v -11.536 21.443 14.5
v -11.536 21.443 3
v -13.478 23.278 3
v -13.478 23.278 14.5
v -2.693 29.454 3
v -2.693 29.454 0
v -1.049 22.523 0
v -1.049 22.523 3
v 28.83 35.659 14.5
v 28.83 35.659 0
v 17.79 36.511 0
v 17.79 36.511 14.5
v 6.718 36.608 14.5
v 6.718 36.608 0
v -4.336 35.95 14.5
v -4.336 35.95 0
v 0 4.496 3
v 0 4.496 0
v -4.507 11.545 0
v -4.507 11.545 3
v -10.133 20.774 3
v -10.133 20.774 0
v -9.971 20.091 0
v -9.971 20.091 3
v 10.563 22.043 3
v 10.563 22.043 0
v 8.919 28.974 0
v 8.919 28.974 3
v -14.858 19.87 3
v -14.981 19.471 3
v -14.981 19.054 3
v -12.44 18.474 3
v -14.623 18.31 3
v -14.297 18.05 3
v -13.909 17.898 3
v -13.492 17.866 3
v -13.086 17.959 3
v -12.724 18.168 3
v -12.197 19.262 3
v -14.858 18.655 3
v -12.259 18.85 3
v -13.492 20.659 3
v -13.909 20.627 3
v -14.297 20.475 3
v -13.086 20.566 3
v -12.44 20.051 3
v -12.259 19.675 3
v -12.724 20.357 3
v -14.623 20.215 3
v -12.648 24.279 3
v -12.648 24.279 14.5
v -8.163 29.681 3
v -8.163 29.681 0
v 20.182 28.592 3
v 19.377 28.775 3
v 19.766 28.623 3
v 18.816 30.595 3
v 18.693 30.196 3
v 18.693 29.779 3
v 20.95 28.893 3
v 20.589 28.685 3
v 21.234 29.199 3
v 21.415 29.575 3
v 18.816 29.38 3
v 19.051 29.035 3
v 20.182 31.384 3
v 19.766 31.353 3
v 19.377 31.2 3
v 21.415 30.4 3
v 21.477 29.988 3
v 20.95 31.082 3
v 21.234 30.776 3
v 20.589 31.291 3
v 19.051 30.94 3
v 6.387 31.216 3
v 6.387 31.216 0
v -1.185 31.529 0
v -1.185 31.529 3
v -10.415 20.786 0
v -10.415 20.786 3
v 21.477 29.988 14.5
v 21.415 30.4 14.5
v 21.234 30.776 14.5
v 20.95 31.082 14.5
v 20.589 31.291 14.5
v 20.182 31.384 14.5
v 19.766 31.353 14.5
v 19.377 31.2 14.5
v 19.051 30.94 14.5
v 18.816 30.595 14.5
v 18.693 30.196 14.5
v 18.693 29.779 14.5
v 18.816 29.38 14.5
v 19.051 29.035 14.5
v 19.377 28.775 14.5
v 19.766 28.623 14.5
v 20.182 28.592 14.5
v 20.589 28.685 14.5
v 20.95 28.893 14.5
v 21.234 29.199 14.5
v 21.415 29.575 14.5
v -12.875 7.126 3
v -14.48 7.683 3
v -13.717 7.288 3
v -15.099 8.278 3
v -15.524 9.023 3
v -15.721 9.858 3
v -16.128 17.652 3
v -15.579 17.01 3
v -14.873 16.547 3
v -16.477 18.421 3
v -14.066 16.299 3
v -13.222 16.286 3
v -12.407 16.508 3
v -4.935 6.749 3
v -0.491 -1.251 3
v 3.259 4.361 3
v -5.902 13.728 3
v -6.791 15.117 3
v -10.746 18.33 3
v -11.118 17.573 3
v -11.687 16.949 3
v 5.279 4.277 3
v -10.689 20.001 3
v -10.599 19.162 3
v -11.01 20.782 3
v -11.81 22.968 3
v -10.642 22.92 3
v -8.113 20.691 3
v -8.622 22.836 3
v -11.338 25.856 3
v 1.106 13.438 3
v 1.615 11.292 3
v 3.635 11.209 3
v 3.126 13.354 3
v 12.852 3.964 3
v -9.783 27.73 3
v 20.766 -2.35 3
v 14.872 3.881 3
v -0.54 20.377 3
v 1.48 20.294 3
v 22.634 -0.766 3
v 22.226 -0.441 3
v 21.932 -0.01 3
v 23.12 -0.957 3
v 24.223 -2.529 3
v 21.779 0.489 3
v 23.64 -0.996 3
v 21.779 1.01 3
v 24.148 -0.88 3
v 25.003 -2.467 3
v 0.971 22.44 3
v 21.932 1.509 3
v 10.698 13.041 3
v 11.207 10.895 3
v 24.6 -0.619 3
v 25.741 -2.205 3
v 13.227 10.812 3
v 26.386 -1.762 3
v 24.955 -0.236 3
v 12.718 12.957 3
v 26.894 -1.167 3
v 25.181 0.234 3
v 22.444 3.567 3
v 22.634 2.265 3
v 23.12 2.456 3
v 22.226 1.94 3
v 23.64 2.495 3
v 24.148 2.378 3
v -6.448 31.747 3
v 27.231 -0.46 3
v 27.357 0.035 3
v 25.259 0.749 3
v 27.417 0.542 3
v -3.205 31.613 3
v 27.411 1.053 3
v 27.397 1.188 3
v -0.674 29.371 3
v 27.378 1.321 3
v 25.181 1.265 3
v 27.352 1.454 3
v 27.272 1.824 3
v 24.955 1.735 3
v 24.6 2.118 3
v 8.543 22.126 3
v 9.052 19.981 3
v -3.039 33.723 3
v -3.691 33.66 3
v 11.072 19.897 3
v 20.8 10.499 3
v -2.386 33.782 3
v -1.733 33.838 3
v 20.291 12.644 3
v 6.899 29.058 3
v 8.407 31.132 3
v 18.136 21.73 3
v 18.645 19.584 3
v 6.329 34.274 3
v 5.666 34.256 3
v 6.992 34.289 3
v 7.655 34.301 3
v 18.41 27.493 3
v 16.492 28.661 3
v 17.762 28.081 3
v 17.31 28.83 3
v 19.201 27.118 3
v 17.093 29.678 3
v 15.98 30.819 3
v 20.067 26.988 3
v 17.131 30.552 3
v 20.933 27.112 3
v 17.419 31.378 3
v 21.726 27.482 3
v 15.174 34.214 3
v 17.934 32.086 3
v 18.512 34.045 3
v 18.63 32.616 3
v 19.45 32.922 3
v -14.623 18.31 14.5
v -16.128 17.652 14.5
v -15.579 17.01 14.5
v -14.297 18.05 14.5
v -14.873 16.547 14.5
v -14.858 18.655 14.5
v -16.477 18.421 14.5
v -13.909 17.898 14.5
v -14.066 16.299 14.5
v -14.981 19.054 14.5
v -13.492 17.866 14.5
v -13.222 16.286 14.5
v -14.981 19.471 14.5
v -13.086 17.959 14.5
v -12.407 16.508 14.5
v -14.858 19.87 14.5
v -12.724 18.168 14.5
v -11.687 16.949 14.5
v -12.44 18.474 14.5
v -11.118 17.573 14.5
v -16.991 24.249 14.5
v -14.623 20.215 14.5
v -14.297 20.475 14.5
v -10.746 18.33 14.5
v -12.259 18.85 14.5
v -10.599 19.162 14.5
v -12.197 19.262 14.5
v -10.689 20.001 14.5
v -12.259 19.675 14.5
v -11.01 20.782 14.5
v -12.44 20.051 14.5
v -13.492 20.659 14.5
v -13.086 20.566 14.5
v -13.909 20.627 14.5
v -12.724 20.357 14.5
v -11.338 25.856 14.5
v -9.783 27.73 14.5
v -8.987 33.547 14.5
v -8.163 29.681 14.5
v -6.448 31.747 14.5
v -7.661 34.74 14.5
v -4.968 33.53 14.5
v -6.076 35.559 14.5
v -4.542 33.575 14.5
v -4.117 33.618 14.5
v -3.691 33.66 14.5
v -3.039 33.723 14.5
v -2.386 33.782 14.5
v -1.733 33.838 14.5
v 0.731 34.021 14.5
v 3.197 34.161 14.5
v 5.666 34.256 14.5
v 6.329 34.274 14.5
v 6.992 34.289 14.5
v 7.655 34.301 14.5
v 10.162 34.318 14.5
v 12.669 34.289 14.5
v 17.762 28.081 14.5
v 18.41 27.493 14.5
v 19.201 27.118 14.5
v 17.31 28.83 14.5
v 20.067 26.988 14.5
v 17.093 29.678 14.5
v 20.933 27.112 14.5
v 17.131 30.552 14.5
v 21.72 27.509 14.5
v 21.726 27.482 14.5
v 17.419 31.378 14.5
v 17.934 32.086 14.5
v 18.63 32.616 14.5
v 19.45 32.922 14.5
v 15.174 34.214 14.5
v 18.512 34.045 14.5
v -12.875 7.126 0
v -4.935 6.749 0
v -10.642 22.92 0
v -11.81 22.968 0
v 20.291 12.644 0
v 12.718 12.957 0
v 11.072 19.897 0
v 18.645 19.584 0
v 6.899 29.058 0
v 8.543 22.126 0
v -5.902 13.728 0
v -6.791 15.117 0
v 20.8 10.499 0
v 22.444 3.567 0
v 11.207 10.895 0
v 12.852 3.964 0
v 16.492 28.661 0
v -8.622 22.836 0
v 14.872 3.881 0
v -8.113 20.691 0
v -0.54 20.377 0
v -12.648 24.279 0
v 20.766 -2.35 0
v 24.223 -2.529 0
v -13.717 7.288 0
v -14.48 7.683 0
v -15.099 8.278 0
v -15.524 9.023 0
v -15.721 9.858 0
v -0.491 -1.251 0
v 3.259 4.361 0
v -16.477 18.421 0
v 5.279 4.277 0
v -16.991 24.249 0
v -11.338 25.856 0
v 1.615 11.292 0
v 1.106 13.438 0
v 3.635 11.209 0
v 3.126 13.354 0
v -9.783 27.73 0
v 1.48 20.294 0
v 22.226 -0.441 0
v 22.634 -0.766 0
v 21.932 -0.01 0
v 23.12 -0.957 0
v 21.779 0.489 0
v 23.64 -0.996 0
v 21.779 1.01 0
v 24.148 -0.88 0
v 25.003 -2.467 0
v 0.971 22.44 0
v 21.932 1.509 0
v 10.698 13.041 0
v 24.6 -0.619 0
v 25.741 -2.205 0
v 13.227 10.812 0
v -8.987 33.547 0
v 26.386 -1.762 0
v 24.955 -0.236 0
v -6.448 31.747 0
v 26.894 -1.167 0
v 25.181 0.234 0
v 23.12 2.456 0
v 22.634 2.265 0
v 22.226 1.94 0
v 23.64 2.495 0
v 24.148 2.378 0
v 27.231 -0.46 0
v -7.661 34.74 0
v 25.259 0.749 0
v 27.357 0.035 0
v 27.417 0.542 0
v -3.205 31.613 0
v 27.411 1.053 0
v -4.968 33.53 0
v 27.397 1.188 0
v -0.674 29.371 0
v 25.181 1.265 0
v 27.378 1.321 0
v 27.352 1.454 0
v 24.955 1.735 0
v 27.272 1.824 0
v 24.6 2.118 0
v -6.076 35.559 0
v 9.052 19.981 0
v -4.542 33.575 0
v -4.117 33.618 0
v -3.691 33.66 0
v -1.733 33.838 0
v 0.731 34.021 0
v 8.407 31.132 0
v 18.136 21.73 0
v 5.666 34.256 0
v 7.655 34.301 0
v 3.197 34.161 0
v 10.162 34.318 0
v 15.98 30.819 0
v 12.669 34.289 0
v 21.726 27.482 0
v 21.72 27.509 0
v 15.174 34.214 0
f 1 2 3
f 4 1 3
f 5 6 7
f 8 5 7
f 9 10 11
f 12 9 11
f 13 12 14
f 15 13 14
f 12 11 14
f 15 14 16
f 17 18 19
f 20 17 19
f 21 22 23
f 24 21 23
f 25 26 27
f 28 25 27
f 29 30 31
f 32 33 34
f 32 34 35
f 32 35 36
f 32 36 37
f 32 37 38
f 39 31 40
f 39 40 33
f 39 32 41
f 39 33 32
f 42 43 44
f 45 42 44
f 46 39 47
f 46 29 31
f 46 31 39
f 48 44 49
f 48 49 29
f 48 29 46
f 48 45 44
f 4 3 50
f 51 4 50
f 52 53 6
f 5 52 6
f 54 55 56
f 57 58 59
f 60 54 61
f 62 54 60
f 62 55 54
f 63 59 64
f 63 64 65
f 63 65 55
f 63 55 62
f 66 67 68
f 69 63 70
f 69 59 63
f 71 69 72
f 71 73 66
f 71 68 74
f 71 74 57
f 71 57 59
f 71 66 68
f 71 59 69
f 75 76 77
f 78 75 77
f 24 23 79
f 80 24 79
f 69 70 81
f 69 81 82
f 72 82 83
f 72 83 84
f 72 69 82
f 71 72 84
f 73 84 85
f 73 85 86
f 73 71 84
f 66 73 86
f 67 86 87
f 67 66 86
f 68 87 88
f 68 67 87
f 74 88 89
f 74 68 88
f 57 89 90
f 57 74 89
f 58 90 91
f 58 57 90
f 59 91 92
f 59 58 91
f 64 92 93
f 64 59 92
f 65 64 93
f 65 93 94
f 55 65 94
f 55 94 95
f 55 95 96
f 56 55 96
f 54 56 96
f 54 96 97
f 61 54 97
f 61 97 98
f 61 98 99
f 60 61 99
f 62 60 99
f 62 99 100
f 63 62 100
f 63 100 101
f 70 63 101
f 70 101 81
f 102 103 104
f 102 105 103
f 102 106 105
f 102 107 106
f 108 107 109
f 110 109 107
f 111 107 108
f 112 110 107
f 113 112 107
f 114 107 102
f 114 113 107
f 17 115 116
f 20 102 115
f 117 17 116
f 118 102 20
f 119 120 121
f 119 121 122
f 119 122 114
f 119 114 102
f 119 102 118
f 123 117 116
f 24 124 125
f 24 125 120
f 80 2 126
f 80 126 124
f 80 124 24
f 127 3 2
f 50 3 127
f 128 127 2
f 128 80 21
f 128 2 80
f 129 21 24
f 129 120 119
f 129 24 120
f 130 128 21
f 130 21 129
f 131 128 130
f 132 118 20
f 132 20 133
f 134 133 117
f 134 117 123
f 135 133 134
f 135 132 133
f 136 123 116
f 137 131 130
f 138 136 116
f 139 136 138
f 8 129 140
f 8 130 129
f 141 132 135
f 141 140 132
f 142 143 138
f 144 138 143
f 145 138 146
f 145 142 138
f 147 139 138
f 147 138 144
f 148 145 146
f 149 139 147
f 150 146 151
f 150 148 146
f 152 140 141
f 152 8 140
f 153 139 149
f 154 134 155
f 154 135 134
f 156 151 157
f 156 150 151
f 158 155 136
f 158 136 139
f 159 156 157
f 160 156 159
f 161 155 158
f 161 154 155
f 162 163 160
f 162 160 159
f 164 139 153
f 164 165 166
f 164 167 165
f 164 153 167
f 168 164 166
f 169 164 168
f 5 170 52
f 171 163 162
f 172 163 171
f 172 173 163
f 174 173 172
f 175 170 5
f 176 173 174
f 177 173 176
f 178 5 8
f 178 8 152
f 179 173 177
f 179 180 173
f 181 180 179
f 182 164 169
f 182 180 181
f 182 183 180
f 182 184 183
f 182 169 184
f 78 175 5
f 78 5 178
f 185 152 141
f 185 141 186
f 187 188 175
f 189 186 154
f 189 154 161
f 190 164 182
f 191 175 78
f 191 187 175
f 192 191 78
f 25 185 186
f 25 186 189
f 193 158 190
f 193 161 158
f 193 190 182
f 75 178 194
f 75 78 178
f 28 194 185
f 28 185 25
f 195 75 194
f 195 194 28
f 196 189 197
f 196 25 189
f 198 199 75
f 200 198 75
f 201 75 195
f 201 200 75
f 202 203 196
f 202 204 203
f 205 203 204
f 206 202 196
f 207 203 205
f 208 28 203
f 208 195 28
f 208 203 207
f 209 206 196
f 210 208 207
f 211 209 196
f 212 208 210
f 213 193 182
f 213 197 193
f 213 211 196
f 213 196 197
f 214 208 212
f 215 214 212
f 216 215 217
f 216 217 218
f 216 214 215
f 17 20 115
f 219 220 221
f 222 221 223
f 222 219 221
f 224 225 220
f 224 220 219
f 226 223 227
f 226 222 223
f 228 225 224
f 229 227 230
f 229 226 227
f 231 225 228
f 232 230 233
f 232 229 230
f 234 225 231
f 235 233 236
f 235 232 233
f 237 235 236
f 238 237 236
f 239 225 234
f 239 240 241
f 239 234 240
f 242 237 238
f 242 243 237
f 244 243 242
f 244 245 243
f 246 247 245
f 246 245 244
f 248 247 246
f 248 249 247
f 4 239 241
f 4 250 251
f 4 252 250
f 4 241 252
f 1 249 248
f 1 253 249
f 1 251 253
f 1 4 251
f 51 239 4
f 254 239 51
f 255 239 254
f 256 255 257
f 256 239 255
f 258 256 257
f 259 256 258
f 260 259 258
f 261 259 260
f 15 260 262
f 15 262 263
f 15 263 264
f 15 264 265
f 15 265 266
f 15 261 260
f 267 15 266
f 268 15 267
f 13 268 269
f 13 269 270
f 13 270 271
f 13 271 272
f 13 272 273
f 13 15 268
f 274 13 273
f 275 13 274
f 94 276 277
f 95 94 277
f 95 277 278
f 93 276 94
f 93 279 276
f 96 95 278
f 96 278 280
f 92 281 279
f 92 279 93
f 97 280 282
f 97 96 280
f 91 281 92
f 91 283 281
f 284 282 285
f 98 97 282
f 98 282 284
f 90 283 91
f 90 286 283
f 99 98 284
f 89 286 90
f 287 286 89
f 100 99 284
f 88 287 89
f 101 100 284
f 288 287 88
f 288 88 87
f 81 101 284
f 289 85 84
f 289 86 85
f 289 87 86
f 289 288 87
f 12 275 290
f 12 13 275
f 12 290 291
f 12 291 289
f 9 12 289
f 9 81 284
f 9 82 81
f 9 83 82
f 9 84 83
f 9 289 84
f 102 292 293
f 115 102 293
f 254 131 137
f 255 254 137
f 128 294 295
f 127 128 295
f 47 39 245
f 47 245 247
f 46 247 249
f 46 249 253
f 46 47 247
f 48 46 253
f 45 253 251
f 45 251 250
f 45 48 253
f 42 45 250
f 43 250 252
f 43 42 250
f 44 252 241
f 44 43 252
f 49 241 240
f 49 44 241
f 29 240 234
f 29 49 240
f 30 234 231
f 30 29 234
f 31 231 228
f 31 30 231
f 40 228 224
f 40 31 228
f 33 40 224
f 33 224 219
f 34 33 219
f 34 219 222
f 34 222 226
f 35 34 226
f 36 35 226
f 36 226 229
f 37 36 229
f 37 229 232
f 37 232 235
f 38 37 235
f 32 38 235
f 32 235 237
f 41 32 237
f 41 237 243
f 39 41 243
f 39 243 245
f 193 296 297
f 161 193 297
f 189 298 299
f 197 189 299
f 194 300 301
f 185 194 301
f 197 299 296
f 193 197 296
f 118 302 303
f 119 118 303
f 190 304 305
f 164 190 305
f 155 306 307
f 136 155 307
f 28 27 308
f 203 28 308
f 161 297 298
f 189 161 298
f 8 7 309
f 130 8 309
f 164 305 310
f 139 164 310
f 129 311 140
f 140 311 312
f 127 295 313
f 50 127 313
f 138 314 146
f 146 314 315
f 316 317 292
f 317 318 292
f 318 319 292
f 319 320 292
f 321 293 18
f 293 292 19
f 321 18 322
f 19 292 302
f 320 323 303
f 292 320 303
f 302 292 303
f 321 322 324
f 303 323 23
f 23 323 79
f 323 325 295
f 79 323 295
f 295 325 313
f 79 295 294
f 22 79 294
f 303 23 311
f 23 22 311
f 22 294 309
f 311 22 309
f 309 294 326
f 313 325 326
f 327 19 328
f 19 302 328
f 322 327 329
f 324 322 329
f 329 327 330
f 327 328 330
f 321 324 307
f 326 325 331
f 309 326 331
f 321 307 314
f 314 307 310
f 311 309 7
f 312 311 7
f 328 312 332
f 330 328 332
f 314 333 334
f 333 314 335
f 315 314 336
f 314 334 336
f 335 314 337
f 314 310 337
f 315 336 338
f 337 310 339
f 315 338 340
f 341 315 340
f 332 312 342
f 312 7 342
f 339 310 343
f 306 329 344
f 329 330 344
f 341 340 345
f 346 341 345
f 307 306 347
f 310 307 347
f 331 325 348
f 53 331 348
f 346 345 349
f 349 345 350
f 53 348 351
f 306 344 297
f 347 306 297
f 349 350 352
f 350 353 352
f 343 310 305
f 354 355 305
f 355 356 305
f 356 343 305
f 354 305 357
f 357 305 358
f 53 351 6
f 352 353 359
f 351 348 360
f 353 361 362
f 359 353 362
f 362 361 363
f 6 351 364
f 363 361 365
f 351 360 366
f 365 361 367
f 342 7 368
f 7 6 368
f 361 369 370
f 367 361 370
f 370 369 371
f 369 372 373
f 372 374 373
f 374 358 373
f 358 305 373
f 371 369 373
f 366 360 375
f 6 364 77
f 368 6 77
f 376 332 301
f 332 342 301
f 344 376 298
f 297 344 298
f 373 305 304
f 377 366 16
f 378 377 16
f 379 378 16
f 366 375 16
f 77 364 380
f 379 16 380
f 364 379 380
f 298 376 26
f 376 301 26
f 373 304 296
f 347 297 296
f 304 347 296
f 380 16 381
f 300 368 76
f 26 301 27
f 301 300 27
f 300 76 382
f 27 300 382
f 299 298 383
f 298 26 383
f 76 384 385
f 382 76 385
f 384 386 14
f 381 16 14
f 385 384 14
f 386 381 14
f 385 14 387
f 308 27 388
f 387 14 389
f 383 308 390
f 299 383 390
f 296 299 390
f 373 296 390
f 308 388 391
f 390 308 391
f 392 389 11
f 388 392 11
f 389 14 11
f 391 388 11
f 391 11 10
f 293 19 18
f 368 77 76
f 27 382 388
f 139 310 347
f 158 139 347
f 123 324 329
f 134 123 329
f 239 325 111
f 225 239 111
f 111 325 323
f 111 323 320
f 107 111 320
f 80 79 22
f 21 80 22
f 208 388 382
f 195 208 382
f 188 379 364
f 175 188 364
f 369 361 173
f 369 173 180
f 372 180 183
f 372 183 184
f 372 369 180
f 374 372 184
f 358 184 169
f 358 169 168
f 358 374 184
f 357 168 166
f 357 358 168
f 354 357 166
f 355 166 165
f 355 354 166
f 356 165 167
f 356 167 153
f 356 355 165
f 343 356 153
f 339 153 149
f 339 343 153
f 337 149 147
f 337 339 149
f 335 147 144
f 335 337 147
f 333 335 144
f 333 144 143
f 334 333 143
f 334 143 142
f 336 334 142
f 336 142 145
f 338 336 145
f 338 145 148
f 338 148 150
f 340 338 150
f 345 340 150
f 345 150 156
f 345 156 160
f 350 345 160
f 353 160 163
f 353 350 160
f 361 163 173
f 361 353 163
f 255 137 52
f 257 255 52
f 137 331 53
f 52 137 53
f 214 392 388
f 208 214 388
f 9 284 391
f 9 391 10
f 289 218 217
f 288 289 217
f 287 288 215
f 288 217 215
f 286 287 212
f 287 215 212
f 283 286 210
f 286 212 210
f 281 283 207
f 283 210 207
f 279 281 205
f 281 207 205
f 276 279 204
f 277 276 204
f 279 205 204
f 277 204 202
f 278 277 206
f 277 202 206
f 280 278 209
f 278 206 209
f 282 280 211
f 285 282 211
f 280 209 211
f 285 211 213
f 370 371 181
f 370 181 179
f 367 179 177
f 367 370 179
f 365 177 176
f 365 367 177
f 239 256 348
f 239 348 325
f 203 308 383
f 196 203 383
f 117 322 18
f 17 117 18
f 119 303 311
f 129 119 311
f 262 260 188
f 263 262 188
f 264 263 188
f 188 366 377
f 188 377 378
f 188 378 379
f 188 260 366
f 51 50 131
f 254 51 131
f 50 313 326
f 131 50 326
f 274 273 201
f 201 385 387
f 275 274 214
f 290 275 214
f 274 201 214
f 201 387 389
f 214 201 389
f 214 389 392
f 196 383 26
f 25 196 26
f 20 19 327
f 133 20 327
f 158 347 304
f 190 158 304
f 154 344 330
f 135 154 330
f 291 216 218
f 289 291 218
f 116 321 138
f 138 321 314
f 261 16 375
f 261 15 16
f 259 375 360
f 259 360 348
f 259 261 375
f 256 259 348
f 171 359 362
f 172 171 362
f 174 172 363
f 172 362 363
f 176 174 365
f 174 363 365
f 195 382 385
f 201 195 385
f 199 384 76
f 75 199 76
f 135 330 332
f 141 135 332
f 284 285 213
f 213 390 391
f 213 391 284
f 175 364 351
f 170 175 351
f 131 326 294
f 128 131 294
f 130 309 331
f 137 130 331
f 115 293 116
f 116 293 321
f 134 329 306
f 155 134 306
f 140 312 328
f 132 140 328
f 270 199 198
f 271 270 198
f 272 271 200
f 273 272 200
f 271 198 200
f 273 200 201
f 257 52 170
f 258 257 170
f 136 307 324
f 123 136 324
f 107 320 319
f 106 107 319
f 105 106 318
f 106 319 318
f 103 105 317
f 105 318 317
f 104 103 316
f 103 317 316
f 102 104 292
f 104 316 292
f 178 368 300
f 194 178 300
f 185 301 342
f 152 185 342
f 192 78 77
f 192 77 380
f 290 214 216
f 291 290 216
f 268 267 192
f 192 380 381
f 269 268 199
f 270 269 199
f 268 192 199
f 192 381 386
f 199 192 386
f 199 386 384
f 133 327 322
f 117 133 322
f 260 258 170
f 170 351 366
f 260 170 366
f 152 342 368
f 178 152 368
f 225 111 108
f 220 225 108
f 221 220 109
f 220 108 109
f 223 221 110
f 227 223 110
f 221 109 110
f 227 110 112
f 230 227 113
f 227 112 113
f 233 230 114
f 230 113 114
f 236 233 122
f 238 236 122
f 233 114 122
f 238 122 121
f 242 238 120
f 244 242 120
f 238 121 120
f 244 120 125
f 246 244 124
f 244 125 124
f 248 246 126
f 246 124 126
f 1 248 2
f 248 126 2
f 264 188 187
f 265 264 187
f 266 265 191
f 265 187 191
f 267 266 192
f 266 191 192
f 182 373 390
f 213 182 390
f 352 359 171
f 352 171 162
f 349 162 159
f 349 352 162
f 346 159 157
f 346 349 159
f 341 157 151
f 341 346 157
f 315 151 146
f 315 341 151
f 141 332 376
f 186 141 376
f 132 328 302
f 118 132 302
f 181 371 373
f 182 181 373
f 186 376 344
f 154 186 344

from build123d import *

# Parameters (mm, degrees)
F0_R        = 1.75
F1_DEPTH    = 3
F0_R_2      = 1.4
F2_DEPTH    = 14.5
F3_DEPTH    = 3
F4_R        = 7
F5_T1_DEPTH = 16.6306186867
F5_T3_DEPTH = 4.3681636199
F5_T5_DEPTH = 16.0958411758
F7_DEPTH    = 3


# Not quite as in the source:
# - a fillet or chamfer that OpenCascade refuses, or shapes differently, is made with other operations: its cross-section is extruded or revolved along the edge and cut away or added
# - two fillets or chamfers of one size are made in one step


with BuildPart() as f1:
    # F0 (on Top) → F1 (new body)
    with BuildSketch(Plane.XY):
        with BuildLine():
            Line((-0.4909088138, -1.2505585665), (20.7660850672, -2.35005825))
            Line((20.7660850672, -2.35005825), (25.5381567791, -2.5968895454))
            ThreePointArc((25.5381567791, -2.5968895454), (27.0513379129, -0.9141469555), (27.3799938245, 1.3248986134))
            Line((27.3799938245, 1.3248986134), (27.2720971653, 1.8240689049))
            Line((27.2720971653, 1.8240689049), (21.7261834625, 27.4815394929))
            ThreePointArc((21.7261834625, 27.4815394929), (17.3096816882, 28.8299287619), (19.4503780507, 32.9215128838))
            Line((19.4503780507, 32.9215128838), (18.5115177807, 34.0451927012))
            Line((18.5115177807, 34.0451927012), (15.1742594532, 34.2144082882))
            Line((15.1742594532, 34.2144082882), (15.9797014768, 30.8189948872))
            Line((15.9797014768, 30.8189948872), (16.4916617939, 28.6607800556))
            Line((16.4916617939, 28.6607800556), (18.135858017, 21.7295227758))
            Line((18.135858017, 21.7295227758), (18.644845427, 19.5838405017))
            Line((18.644845427, 19.5838405017), (20.2910235881, 12.6442281836))
            Line((20.2910235881, 12.6442281836), (20.8000109982, 10.4985459094))
            Line((20.8000109982, 10.4985459094), (22.4442072213, 3.5672886297))
            Line((22.4442072213, 3.5672886297), (14.8716080252, 3.8805312748))
            Line((14.8716080252, 3.8805312748), (12.8516365903, 3.9640879479))
            Line((12.8516365903, 3.9640879479), (5.2790373942, 4.2773305929))
            Line((5.2790373942, 4.2773305929), (3.2590659592, 4.360887266))
            Line((3.2590659592, 4.360887266), (0, 4.4956994243))
            Line((0, 4.4956994243), (-4.5071129665, 11.5453820412))
            Line((-4.5071129665, 11.5453820412), (-5.9023623433, 13.727724785))
            Line((-5.9023623433, 13.727724785), (-6.7908302355, 15.1173985523))
            Line((-6.7908302355, 15.1173985523), (-9.9708875905, 20.0914019161))
            Line((-9.9708875905, 20.0914019161), (-10.4149082493, 20.7859051919))
            Line((-10.4149082493, 20.7859051919), (-11.8101576261, 22.9682479357))
            Line((-11.8101576261, 22.9682479357), (-12.6478674294, 24.2785297685))
            Line((-12.6478674294, 24.2785297685), (-13.4783331305, 23.2781674713))
            Line((-13.4783331305, 23.2781674713), (-11.5363753254, 21.4427254814))
            ThreePointArc((-11.5363753254, 21.4427254814), (-12.0316990994, 16.7032264224), (-16.4766345607, 18.4209998989))
            Line((-16.4766345607, 18.4209998989), (-15.4909088138, 7.2494414335))
            Line((-15.4909088138, 7.2494414335), (-4.9353532582, 6.7494414335))
            Line((-4.9353532582, 6.7494414335), (-0.4909088138, -1.2505585665))
        make_face()
        with Locations((23.5090911862, 0.7494414335)):
            Circle(F0_R, mode=Mode.SUBTRACT)
    extrude(amount=F1_DEPTH)

    # F0 (on Top) → F2 (join)
    with BuildSketch(Plane.XY):
        with BuildLine():
            Line((-16.9909088138, 24.2494414335), (-16.4766345607, 18.4209998989))
            ThreePointArc((-16.4766345607, 18.4209998989), (-12.0316990994, 16.7032264224), (-11.5363753254, 21.4427254814))
            Line((-11.5363753254, 21.4427254814), (-13.4783331305, 23.2781674713))
            Line((-13.4783331305, 23.2781674713), (-12.6478674294, 24.2785297685))
            Line((-12.6478674294, 24.2785297685), (-11.3383288336, 25.8559736489))
            Line((-11.3383288336, 25.8559736489), (-9.782692223, 27.729862253))
            Line((-9.782692223, 27.729862253), (-8.1632279798, 29.680636341))
            Line((-8.1632279798, 29.680636341), (-6.4480341787, 31.746724331))
            Line((-6.4480341787, 31.746724331), (-4.9677388347, 33.5298583591))
            ThreePointArc((-4.9677388347, 33.5298583591), (-4.3296328325, 33.596636032), (-3.691225205, 33.6604657178))
            ThreePointArc((-3.691225205, 33.6604657178), (-2.7124843131, 33.7525453098), (-1.7331162834, 33.8376960422))
            ThreePointArc((-1.7331162834, 33.8376960422), (1.9635943301, 34.0963274062), (5.6658885292, 34.2562561568))
            ThreePointArc((5.6658885292, 34.2562561568), (6.6605332405, 34.2823712951), (7.6553394943, 34.3013612736))
            ThreePointArc((7.6553394943, 34.3013612736), (11.4153879508, 34.3087710358), (15.1742594532, 34.2144082882))
            Line((15.1742594532, 34.2144082882), (18.5115177807, 34.0451927012))
            Line((18.5115177807, 34.0451927012), (19.4503780507, 32.9215128838))
            ThreePointArc((19.4503780507, 32.9215128838), (17.3096816882, 28.8299287619), (21.7261834625, 27.4815394929))
            Line((21.7261834625, 27.4815394929), (21.7201782041, 27.5093220636))
            Line((21.7201782041, 27.5093220636), (28.8304557098, 35.6590934098))
            ThreePointArc((28.8304557098, 35.6590934098), (10.8304557098, 36.6599030898), (-7.1695442902, 35.6590934098))
            Line((-7.1695442902, 35.6590934098), (-16.9909088138, 24.2494414335))
        make_face()
        with Locations((-13.5970591864, 19.2624543916)):
            Circle(F0_R_2, mode=Mode.SUBTRACT)
        with Locations((20.077256969, 29.9877400872)):
            Circle(F0_R_2, mode=Mode.SUBTRACT)
    extrude(amount=F2_DEPTH)

    # F0 (on Top) → F3 (join)
    with BuildSketch(Plane.XY):
        with BuildLine():
            Line((-9.782692223, 27.729862253), (-11.3383288336, 25.8559736489))
            Line((-11.3383288336, 25.8559736489), (-10.6418538761, 22.9199207303))
            Line((-10.6418538761, 22.9199207303), (-11.8101576261, 22.9682479357))
            Line((-11.8101576261, 22.9682479357), (-10.4149082493, 20.7859051919))
            Line((-10.4149082493, 20.7859051919), (-10.132866466, 20.7742384561))
            Line((-10.132866466, 20.7742384561), (-9.9708875905, 20.0914019161))
            Line((-9.9708875905, 20.0914019161), (-6.7908302355, 15.1173985523))
            Line((-6.7908302355, 15.1173985523), (-8.112895031, 20.690681783))
            Line((-8.112895031, 20.690681783), (-0.540295835, 20.3774391379))
            Line((-0.540295835, 20.377439138), (1.1058823261, 13.4378268199))
            Line((1.1058823261, 13.4378268199), (-5.9023623433, 13.727724785))
            Line((-5.9023623433, 13.727724785), (-4.5071129665, 11.5453820412))
            Line((-4.5071129665, 11.5453820412), (1.6148697362, 11.2921445457))
            Line((1.6148697362, 11.2921445457), (3.2590659592, 4.360887266))
            Line((3.2590659592, 4.360887266), (5.2790373942, 4.2773305929))
            Line((5.2790373942, 4.2773305929), (3.6348411711, 11.2085878727))
            Line((3.6348411711, 11.2085878727), (11.2074403672, 10.8953452276))
            Line((11.2074403672, 10.8953452276), (12.8516365903, 3.9640879479))
            Line((12.8516365903, 3.9640879479), (14.8716080252, 3.8805312748))
            Line((14.8716080252, 3.8805312748), (13.2274118021, 10.8117885545))
            Line((13.2274118021, 10.8117885545), (20.8000109982, 10.4985459094))
            Line((20.8000109982, 10.4985459094), (20.2910235881, 12.6442281836))
            Line((20.2910235881, 12.6442281836), (12.7184243921, 12.9574708287))
            Line((12.7184243921, 12.9574708287), (11.072246231, 19.8970831467))
            Line((11.072246231, 19.8970831467), (18.644845427, 19.5838405017))
            Line((18.644845427, 19.5838405017), (18.135858017, 21.7295227758))
            Line((18.135858017, 21.7295227758), (10.5632588209, 22.0427654209))
            Line((10.5632588209, 22.0427654209), (8.9190625979, 28.9740227006))
            Line((8.9190625979, 28.9740227006), (16.4916617939, 28.6607800556))
            Line((16.4916617939, 28.6607800556), (15.9797014768, 30.8189948872))
            Line((15.9797014768, 30.8189948872), (8.4071022808, 31.1322375323))
            Line((8.4071022808, 31.1322375323), (7.6553394943, 34.3013612736))
            ThreePointArc((7.6553394943, 34.3013612736), (6.6605332405, 34.2823712951), (5.6658885292, 34.2562561568))
            Line((5.6658885292, 34.2562561568), (6.3871308458, 31.2157942054))
            Line((6.3871308458, 31.2157942054), (-1.1854683502, 31.5290368504))
            Line((-1.1854683502, 31.5290368504), (-1.7331162834, 33.8376960422))
            ThreePointArc((-1.7331162834, 33.8376960422), (-2.7124843131, 33.7525453098), (-3.691225205, 33.6604657178))
            Line((-3.691225205, 33.6604657178), (-3.2054397853, 31.6125935235))
            Line((-3.2054397853, 31.6125935235), (-6.4480341787, 31.746724331))
            Line((-6.4480341787, 31.746724331), (-8.1632279798, 29.680636341))
            Line((-8.1632279798, 29.680636341), (-2.6934794682, 29.4543786918))
            Line((-2.6934794682, 29.4543786918), (-1.0492832451, 22.5231214121))
            Line((-1.0492832451, 22.5231214121), (-8.6218824411, 22.8363640572))
            Line((-8.6218824411, 22.8363640572), (-9.782692223, 27.729862253))
        make_face()
        Polygon((1.4796756, 20.2938824649), (9.052274796, 19.9806398198), (10.6984529571, 13.0410275017), (3.1258537611, 13.3542701468), align=None, mode=Mode.SUBTRACT)
        Polygon((8.543287386, 22.126322094), (0.9706881899, 22.439564739), (-0.6735080331, 29.3708220188), (6.8990911629, 29.0575793737), align=None, mode=Mode.SUBTRACT)
    extrude(amount=F3_DEPTH)

    # F4
    f4_edges = [f1.edges().sort_by_distance(p)[0] for p in [
        (-7.169544, 35.659093, 7.25),
    ]]
    fillet(f4_edges, radius=F4_R)

    # F5: fillet of radius 3 on 3 edges, made by hand

    # F5_s2 → F5_t1 (cut)
    with BuildSketch(Plane.XY.offset(-6.8153093434)):
        with BuildLine():
            ThreePointArc((27.2309502901, -0.4600225022), (26.0778302758, -2.0046934728), (24.2228512202, -2.5288564993))
            Line((24.2228512202, -2.5288564993), (25.5381567791, -2.5968895454))
            ThreePointArc((25.5381567791, -2.5968895454), (26.5766364437, -1.6806211776), (27.2309502901, -0.4600225022))
        make_face()
    extrude(amount=F5_T1_DEPTH, mode=Mode.SUBTRACT)

    # F5_s4 → F5_t3 (cut)
    with BuildSketch(Plane.XY.offset(-0.6840818099)):
        with BuildLine():
            ThreePointArc((27.3520636944, 1.4541138391), (27.3881865873, 1.2545487843), (27.4107435182, 1.0529991394))
            ThreePointArc((27.4107435182, 1.0529991394), (27.3977458408, 1.1892177156), (27.3799938245, 1.3248986134))
            Line((27.3799938245, 1.3248986134), (27.3520636944, 1.4541138391))
        make_face()
    extrude(amount=F5_T3_DEPTH, mode=Mode.SUBTRACT)

    # F5_s6 → F5_t5 (cut)
    with BuildSketch(Plane.XY.offset(-6.5479205879)):
        with BuildLine():
            ThreePointArc((-15.7211174898, 9.8584730948), (-14.8104709381, 7.9581341855), (-12.8746740451, 7.1255145234))
            Line((-12.8746740451, 7.1255145234), (-15.4909088138, 7.2494414335))
            Line((-15.4909088138, 7.2494414335), (-15.7211174898, 9.8584730948))
        make_face()
    extrude(amount=F5_T5_DEPTH, mode=Mode.SUBTRACT)

    # F0 (on Top) → F7 (join)
    with BuildSketch(Plane.XY):
        with Locations((20.077256969, 29.9877400872)):
            Circle(F0_R_2)
        with Locations((-13.5970591864, 19.2624543916)):
            Circle(F0_R_2)
    extrude(amount=F7_DEPTH)


solid = f1.part
